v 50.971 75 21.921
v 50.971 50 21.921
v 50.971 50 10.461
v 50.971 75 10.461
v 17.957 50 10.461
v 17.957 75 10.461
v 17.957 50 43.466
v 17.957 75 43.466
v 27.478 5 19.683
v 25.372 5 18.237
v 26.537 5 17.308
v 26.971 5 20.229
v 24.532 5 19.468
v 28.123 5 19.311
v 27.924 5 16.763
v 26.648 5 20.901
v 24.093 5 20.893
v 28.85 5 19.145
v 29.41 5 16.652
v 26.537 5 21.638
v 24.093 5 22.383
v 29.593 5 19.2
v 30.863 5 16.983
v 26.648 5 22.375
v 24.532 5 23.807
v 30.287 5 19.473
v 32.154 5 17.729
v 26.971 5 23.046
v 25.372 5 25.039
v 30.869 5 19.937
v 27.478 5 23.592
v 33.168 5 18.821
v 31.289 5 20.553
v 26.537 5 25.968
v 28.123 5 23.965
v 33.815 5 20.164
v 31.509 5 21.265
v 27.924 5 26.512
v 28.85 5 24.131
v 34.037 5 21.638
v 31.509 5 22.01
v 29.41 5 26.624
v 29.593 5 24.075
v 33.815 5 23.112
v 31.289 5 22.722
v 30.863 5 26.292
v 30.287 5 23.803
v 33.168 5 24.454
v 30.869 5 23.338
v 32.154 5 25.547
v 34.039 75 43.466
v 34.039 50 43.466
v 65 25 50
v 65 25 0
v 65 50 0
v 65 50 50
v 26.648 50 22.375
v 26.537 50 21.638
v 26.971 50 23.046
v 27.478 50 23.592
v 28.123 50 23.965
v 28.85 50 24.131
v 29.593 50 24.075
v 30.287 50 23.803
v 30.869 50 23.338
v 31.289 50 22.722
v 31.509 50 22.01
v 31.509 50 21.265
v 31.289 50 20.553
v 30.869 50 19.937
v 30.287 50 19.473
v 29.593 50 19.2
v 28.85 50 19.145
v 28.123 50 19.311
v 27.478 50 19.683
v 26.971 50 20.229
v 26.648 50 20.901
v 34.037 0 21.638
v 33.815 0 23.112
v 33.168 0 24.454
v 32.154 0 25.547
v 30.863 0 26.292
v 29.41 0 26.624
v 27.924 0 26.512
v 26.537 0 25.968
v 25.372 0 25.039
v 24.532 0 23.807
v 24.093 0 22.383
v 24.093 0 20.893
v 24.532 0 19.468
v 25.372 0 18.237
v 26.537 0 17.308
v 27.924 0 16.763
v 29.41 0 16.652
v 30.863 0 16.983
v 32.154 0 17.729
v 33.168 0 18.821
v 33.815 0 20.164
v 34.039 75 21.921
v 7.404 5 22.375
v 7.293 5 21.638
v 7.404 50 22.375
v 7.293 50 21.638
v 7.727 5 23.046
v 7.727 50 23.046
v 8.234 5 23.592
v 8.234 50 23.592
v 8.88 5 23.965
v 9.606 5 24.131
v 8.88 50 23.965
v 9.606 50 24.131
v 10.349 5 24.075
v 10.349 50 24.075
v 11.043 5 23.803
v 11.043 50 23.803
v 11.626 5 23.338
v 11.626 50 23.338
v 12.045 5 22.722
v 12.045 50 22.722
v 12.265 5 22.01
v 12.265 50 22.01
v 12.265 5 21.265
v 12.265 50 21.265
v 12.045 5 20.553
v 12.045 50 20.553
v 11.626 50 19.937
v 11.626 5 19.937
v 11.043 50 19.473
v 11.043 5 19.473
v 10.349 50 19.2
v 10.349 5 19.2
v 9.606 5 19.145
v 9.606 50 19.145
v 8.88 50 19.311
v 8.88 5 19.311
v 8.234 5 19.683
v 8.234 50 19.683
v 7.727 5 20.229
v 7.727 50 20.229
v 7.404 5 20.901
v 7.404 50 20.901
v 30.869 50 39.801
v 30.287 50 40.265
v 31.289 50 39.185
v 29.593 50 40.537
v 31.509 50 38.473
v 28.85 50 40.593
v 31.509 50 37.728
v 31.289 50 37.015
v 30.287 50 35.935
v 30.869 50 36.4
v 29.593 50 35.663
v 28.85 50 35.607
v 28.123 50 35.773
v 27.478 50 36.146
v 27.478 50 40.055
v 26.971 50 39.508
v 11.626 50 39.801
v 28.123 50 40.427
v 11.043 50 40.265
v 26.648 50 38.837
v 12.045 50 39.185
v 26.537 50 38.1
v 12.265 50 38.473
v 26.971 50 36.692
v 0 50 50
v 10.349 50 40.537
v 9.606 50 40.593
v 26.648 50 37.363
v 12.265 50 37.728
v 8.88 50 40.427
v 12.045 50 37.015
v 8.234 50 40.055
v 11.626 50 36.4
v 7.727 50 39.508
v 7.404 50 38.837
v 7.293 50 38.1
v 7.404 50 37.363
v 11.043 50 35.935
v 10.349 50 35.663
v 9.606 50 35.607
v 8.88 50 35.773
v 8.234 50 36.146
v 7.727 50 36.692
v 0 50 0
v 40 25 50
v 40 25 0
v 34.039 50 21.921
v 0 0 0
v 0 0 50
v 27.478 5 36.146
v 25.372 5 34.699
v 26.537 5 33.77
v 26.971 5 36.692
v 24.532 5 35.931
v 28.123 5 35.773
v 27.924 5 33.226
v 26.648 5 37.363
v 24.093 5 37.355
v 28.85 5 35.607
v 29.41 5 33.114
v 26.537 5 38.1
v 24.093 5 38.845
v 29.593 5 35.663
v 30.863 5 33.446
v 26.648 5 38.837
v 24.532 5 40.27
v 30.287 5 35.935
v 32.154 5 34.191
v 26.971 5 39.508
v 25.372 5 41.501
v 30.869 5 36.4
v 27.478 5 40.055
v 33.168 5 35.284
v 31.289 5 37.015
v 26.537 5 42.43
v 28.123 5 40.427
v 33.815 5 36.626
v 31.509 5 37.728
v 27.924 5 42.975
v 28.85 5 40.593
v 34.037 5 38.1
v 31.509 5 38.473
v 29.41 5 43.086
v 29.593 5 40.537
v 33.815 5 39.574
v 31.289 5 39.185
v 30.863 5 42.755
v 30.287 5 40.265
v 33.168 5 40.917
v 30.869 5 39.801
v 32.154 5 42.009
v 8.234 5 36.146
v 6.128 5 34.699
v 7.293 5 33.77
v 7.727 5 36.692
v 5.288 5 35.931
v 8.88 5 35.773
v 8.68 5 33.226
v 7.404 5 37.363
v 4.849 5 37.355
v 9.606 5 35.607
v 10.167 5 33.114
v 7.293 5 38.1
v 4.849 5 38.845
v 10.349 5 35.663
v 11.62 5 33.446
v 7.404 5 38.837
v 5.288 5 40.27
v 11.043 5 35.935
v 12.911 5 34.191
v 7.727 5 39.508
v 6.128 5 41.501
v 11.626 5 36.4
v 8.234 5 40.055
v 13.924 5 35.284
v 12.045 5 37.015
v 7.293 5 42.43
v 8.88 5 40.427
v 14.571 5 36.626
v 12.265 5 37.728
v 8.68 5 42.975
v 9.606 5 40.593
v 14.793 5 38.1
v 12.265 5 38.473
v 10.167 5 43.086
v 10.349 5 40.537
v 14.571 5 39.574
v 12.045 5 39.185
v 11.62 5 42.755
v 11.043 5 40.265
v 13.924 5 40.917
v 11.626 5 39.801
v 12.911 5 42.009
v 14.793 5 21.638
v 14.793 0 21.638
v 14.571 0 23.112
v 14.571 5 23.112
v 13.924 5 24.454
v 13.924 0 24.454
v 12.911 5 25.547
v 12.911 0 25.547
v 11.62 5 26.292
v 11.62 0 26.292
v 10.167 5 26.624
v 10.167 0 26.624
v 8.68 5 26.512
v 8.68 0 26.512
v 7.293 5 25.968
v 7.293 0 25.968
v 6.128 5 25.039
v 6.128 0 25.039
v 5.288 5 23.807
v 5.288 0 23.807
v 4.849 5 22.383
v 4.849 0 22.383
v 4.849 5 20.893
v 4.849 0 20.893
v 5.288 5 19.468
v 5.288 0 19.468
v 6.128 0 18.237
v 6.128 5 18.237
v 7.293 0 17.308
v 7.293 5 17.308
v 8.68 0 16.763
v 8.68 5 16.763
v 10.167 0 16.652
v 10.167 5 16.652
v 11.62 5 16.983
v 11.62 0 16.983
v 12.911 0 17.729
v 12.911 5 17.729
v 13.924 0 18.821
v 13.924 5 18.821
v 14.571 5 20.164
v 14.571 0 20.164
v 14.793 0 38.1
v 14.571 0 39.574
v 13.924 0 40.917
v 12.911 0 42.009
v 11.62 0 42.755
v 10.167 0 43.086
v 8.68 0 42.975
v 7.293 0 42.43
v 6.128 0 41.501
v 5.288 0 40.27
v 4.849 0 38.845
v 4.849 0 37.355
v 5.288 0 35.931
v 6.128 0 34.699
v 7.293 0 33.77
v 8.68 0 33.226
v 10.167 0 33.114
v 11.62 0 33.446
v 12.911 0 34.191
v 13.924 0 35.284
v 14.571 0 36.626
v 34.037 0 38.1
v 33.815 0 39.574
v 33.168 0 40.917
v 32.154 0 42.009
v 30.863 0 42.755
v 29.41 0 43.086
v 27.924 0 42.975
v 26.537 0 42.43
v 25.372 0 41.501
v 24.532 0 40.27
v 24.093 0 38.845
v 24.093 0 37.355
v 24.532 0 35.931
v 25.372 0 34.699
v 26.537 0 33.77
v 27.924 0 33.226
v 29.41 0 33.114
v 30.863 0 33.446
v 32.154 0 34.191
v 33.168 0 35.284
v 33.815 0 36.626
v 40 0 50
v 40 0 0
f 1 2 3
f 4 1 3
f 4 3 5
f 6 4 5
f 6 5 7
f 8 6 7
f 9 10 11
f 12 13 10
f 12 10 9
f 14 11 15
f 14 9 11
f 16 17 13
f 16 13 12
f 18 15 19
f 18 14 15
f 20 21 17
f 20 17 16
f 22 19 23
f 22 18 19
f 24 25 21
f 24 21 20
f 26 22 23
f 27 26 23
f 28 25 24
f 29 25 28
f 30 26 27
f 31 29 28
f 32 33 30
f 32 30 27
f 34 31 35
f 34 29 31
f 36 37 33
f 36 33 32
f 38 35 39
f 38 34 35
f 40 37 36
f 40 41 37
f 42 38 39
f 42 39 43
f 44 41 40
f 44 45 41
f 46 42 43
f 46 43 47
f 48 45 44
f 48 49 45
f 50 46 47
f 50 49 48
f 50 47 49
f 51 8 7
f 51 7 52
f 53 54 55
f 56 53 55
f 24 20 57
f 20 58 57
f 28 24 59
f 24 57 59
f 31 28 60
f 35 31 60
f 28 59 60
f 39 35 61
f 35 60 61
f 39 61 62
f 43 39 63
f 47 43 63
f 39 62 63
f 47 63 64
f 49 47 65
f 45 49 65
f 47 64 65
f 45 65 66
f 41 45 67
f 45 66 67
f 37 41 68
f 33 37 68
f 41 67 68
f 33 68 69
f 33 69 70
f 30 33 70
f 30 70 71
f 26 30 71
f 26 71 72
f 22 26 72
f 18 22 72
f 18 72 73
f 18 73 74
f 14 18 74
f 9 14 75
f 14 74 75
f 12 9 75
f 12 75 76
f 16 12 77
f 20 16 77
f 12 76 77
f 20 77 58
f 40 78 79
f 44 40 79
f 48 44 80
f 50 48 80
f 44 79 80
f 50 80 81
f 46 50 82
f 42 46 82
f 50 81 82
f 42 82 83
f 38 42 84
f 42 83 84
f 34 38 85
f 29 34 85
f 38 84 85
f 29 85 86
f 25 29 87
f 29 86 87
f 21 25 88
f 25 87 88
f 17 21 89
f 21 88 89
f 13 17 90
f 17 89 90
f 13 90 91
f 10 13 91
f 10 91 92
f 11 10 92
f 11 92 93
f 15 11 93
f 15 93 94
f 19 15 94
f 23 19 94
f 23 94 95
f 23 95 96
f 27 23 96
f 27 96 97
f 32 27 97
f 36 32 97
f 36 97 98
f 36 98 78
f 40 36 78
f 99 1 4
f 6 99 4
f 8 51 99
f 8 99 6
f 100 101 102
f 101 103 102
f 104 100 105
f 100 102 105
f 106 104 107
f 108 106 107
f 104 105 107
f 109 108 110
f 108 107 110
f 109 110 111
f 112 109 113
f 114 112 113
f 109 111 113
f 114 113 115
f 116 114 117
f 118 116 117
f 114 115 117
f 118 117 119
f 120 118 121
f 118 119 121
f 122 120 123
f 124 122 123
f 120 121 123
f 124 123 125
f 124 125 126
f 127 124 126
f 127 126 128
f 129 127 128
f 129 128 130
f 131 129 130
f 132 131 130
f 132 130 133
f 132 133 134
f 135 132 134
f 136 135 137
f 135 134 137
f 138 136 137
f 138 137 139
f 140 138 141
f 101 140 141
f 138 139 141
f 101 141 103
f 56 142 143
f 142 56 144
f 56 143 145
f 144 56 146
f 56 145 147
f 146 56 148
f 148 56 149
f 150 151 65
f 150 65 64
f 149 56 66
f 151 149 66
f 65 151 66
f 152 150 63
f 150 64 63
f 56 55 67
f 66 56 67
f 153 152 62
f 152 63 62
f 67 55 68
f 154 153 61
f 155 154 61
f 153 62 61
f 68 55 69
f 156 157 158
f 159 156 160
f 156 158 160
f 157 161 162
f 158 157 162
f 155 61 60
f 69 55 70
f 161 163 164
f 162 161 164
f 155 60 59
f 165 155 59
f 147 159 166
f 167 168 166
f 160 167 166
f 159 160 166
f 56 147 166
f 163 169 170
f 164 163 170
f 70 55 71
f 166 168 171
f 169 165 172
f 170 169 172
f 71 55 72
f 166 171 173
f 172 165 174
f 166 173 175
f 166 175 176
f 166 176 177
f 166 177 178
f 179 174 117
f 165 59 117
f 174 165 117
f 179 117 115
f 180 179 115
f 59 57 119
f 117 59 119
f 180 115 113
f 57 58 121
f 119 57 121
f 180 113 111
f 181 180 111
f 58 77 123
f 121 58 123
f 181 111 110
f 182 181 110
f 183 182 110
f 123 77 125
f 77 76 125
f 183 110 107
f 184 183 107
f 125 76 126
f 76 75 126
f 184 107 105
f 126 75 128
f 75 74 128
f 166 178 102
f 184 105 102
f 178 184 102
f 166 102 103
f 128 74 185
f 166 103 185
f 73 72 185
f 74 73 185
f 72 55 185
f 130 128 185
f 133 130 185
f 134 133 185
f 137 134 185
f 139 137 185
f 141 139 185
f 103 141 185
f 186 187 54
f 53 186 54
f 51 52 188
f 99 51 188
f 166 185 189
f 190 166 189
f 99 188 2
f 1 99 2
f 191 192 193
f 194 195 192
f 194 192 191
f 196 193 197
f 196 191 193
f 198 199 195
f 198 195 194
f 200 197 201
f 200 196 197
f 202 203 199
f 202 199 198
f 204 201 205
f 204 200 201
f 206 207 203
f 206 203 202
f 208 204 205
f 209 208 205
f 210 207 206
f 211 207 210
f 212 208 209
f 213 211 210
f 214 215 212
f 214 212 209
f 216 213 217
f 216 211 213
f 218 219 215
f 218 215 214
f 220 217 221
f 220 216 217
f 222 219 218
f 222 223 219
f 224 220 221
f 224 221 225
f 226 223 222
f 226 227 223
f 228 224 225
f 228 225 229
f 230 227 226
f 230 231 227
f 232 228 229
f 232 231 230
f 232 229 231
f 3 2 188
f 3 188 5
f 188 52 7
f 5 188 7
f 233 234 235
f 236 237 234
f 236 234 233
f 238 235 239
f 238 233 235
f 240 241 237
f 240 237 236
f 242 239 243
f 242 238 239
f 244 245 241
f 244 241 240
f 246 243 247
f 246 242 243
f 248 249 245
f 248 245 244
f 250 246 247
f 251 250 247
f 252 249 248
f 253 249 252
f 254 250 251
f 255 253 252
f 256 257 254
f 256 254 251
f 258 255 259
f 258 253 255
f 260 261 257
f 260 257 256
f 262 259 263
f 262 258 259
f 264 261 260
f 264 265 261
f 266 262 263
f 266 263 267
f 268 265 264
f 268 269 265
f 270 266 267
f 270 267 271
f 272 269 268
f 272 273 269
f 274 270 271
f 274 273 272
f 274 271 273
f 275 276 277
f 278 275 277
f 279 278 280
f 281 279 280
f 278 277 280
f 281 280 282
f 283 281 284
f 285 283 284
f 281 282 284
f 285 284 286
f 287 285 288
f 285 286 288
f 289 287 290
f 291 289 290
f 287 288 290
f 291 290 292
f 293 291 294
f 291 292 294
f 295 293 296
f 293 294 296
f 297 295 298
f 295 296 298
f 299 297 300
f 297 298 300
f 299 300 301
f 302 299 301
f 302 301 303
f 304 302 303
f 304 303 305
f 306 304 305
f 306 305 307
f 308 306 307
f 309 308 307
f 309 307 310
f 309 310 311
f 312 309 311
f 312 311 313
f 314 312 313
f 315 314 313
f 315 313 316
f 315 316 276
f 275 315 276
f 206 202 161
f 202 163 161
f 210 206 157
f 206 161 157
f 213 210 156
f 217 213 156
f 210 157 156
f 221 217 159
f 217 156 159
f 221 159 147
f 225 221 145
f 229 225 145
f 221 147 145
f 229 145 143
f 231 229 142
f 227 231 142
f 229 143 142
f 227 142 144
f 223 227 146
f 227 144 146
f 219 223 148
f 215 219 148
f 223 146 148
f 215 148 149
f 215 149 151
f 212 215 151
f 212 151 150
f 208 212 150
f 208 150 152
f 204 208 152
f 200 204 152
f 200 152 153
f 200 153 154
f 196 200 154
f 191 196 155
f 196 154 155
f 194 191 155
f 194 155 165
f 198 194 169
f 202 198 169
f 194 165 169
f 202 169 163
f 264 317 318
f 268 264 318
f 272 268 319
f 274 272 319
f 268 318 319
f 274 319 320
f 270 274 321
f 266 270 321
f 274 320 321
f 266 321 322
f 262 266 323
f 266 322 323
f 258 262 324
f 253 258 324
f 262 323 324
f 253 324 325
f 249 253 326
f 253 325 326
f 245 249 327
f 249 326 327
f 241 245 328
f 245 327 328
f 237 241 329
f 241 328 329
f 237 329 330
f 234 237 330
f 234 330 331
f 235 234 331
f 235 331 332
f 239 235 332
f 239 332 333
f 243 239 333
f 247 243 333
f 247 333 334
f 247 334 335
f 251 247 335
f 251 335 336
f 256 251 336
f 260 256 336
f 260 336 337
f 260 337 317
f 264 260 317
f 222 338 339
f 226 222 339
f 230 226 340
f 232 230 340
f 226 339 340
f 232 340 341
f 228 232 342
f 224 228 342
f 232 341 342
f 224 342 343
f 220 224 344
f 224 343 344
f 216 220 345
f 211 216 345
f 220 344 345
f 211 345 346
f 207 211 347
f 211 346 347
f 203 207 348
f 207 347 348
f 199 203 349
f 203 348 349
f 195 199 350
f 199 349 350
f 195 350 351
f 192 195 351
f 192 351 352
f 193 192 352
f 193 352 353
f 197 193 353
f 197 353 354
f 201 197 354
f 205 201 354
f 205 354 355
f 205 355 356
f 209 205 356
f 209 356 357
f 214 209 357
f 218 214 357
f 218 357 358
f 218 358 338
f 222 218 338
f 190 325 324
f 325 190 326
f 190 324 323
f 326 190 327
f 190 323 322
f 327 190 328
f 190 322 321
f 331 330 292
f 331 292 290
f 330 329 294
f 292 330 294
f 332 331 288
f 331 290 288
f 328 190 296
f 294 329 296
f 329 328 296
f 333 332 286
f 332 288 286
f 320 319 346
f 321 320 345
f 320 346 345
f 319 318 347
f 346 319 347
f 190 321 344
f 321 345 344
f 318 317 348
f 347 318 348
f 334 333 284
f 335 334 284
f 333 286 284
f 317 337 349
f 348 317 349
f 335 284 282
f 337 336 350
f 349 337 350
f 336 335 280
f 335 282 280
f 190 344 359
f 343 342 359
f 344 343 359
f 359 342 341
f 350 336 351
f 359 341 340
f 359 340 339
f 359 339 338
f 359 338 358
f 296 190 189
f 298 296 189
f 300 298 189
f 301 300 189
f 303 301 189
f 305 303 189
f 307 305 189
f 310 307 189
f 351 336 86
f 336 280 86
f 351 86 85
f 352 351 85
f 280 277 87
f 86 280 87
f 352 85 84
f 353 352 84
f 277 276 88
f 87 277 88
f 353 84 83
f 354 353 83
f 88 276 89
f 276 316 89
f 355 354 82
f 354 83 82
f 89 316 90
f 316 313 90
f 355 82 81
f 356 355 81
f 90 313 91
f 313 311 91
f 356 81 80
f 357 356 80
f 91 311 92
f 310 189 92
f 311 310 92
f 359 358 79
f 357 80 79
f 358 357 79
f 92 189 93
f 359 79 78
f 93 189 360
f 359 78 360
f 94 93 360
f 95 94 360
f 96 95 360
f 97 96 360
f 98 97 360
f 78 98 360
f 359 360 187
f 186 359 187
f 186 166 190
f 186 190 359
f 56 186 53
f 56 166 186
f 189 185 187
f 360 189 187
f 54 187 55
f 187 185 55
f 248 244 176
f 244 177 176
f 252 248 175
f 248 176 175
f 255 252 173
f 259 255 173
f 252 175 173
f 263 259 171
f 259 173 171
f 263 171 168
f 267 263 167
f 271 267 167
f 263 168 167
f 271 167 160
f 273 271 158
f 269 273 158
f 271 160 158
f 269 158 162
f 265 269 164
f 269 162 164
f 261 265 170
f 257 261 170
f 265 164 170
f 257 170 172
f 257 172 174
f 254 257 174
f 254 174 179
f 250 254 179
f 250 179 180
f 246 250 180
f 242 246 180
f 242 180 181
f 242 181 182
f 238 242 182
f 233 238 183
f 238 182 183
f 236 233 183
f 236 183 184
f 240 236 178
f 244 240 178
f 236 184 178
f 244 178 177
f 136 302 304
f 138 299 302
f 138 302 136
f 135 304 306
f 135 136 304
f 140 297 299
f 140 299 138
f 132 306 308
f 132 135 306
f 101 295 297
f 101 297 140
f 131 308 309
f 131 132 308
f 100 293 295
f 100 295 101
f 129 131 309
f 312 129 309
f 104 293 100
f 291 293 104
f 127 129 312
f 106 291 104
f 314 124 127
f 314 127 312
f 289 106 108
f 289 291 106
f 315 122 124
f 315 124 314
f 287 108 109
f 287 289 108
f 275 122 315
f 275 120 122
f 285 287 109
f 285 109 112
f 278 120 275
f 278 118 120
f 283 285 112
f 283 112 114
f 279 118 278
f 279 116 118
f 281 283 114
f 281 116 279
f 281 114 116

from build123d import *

# Parameters (mm, degrees)
F5_DEPTH       = 50
F2_DEPTH       = 25
F3_D           = 5
F3_CBORE_D     = 10
F3_CBORE_DEPTH = 5


with BuildPart() as f5:
    # F4 (on Top) → F5 (new body)
    with BuildSketch(Plane.XY):
        Polygon((0, 50), (0, 0), (40, 0), (40, 25), (65, 25), (65, 50), align=None)
    extrude(amount=F5_DEPTH)

    # F3 (through all)
    with Locations(Plane.XZ):
        with Locations((9.7930580378, 21.6377787292), (29.0367603302, 21.6377787292), (29.0367603302, 38.1001420319), (9.7930580378, 38.1001420319)):
            CounterBoreHole(F3_D / 2, F3_CBORE_D / 2, F3_CBORE_DEPTH)


with BuildPart() as f2:
    # F0 (on face) → F2 (new body)
    with BuildSketch(Plane(origin=(0, 50, 0), x_dir=(-1, 0, 0), z_dir=(0, 1, 0))):
        Polygon((-50.9705469012, 10.4610286653), (-17.9573744535, 10.4610286653), (-17.9573744535, 43.465744704), (-34.0392068028, 43.465744704), (-34.0392068028, 21.9214968383), (-50.9705469012, 21.9214968383), align=None)
    extrude(amount=F2_DEPTH)


solid = Compound([f5.part, f2.part])
